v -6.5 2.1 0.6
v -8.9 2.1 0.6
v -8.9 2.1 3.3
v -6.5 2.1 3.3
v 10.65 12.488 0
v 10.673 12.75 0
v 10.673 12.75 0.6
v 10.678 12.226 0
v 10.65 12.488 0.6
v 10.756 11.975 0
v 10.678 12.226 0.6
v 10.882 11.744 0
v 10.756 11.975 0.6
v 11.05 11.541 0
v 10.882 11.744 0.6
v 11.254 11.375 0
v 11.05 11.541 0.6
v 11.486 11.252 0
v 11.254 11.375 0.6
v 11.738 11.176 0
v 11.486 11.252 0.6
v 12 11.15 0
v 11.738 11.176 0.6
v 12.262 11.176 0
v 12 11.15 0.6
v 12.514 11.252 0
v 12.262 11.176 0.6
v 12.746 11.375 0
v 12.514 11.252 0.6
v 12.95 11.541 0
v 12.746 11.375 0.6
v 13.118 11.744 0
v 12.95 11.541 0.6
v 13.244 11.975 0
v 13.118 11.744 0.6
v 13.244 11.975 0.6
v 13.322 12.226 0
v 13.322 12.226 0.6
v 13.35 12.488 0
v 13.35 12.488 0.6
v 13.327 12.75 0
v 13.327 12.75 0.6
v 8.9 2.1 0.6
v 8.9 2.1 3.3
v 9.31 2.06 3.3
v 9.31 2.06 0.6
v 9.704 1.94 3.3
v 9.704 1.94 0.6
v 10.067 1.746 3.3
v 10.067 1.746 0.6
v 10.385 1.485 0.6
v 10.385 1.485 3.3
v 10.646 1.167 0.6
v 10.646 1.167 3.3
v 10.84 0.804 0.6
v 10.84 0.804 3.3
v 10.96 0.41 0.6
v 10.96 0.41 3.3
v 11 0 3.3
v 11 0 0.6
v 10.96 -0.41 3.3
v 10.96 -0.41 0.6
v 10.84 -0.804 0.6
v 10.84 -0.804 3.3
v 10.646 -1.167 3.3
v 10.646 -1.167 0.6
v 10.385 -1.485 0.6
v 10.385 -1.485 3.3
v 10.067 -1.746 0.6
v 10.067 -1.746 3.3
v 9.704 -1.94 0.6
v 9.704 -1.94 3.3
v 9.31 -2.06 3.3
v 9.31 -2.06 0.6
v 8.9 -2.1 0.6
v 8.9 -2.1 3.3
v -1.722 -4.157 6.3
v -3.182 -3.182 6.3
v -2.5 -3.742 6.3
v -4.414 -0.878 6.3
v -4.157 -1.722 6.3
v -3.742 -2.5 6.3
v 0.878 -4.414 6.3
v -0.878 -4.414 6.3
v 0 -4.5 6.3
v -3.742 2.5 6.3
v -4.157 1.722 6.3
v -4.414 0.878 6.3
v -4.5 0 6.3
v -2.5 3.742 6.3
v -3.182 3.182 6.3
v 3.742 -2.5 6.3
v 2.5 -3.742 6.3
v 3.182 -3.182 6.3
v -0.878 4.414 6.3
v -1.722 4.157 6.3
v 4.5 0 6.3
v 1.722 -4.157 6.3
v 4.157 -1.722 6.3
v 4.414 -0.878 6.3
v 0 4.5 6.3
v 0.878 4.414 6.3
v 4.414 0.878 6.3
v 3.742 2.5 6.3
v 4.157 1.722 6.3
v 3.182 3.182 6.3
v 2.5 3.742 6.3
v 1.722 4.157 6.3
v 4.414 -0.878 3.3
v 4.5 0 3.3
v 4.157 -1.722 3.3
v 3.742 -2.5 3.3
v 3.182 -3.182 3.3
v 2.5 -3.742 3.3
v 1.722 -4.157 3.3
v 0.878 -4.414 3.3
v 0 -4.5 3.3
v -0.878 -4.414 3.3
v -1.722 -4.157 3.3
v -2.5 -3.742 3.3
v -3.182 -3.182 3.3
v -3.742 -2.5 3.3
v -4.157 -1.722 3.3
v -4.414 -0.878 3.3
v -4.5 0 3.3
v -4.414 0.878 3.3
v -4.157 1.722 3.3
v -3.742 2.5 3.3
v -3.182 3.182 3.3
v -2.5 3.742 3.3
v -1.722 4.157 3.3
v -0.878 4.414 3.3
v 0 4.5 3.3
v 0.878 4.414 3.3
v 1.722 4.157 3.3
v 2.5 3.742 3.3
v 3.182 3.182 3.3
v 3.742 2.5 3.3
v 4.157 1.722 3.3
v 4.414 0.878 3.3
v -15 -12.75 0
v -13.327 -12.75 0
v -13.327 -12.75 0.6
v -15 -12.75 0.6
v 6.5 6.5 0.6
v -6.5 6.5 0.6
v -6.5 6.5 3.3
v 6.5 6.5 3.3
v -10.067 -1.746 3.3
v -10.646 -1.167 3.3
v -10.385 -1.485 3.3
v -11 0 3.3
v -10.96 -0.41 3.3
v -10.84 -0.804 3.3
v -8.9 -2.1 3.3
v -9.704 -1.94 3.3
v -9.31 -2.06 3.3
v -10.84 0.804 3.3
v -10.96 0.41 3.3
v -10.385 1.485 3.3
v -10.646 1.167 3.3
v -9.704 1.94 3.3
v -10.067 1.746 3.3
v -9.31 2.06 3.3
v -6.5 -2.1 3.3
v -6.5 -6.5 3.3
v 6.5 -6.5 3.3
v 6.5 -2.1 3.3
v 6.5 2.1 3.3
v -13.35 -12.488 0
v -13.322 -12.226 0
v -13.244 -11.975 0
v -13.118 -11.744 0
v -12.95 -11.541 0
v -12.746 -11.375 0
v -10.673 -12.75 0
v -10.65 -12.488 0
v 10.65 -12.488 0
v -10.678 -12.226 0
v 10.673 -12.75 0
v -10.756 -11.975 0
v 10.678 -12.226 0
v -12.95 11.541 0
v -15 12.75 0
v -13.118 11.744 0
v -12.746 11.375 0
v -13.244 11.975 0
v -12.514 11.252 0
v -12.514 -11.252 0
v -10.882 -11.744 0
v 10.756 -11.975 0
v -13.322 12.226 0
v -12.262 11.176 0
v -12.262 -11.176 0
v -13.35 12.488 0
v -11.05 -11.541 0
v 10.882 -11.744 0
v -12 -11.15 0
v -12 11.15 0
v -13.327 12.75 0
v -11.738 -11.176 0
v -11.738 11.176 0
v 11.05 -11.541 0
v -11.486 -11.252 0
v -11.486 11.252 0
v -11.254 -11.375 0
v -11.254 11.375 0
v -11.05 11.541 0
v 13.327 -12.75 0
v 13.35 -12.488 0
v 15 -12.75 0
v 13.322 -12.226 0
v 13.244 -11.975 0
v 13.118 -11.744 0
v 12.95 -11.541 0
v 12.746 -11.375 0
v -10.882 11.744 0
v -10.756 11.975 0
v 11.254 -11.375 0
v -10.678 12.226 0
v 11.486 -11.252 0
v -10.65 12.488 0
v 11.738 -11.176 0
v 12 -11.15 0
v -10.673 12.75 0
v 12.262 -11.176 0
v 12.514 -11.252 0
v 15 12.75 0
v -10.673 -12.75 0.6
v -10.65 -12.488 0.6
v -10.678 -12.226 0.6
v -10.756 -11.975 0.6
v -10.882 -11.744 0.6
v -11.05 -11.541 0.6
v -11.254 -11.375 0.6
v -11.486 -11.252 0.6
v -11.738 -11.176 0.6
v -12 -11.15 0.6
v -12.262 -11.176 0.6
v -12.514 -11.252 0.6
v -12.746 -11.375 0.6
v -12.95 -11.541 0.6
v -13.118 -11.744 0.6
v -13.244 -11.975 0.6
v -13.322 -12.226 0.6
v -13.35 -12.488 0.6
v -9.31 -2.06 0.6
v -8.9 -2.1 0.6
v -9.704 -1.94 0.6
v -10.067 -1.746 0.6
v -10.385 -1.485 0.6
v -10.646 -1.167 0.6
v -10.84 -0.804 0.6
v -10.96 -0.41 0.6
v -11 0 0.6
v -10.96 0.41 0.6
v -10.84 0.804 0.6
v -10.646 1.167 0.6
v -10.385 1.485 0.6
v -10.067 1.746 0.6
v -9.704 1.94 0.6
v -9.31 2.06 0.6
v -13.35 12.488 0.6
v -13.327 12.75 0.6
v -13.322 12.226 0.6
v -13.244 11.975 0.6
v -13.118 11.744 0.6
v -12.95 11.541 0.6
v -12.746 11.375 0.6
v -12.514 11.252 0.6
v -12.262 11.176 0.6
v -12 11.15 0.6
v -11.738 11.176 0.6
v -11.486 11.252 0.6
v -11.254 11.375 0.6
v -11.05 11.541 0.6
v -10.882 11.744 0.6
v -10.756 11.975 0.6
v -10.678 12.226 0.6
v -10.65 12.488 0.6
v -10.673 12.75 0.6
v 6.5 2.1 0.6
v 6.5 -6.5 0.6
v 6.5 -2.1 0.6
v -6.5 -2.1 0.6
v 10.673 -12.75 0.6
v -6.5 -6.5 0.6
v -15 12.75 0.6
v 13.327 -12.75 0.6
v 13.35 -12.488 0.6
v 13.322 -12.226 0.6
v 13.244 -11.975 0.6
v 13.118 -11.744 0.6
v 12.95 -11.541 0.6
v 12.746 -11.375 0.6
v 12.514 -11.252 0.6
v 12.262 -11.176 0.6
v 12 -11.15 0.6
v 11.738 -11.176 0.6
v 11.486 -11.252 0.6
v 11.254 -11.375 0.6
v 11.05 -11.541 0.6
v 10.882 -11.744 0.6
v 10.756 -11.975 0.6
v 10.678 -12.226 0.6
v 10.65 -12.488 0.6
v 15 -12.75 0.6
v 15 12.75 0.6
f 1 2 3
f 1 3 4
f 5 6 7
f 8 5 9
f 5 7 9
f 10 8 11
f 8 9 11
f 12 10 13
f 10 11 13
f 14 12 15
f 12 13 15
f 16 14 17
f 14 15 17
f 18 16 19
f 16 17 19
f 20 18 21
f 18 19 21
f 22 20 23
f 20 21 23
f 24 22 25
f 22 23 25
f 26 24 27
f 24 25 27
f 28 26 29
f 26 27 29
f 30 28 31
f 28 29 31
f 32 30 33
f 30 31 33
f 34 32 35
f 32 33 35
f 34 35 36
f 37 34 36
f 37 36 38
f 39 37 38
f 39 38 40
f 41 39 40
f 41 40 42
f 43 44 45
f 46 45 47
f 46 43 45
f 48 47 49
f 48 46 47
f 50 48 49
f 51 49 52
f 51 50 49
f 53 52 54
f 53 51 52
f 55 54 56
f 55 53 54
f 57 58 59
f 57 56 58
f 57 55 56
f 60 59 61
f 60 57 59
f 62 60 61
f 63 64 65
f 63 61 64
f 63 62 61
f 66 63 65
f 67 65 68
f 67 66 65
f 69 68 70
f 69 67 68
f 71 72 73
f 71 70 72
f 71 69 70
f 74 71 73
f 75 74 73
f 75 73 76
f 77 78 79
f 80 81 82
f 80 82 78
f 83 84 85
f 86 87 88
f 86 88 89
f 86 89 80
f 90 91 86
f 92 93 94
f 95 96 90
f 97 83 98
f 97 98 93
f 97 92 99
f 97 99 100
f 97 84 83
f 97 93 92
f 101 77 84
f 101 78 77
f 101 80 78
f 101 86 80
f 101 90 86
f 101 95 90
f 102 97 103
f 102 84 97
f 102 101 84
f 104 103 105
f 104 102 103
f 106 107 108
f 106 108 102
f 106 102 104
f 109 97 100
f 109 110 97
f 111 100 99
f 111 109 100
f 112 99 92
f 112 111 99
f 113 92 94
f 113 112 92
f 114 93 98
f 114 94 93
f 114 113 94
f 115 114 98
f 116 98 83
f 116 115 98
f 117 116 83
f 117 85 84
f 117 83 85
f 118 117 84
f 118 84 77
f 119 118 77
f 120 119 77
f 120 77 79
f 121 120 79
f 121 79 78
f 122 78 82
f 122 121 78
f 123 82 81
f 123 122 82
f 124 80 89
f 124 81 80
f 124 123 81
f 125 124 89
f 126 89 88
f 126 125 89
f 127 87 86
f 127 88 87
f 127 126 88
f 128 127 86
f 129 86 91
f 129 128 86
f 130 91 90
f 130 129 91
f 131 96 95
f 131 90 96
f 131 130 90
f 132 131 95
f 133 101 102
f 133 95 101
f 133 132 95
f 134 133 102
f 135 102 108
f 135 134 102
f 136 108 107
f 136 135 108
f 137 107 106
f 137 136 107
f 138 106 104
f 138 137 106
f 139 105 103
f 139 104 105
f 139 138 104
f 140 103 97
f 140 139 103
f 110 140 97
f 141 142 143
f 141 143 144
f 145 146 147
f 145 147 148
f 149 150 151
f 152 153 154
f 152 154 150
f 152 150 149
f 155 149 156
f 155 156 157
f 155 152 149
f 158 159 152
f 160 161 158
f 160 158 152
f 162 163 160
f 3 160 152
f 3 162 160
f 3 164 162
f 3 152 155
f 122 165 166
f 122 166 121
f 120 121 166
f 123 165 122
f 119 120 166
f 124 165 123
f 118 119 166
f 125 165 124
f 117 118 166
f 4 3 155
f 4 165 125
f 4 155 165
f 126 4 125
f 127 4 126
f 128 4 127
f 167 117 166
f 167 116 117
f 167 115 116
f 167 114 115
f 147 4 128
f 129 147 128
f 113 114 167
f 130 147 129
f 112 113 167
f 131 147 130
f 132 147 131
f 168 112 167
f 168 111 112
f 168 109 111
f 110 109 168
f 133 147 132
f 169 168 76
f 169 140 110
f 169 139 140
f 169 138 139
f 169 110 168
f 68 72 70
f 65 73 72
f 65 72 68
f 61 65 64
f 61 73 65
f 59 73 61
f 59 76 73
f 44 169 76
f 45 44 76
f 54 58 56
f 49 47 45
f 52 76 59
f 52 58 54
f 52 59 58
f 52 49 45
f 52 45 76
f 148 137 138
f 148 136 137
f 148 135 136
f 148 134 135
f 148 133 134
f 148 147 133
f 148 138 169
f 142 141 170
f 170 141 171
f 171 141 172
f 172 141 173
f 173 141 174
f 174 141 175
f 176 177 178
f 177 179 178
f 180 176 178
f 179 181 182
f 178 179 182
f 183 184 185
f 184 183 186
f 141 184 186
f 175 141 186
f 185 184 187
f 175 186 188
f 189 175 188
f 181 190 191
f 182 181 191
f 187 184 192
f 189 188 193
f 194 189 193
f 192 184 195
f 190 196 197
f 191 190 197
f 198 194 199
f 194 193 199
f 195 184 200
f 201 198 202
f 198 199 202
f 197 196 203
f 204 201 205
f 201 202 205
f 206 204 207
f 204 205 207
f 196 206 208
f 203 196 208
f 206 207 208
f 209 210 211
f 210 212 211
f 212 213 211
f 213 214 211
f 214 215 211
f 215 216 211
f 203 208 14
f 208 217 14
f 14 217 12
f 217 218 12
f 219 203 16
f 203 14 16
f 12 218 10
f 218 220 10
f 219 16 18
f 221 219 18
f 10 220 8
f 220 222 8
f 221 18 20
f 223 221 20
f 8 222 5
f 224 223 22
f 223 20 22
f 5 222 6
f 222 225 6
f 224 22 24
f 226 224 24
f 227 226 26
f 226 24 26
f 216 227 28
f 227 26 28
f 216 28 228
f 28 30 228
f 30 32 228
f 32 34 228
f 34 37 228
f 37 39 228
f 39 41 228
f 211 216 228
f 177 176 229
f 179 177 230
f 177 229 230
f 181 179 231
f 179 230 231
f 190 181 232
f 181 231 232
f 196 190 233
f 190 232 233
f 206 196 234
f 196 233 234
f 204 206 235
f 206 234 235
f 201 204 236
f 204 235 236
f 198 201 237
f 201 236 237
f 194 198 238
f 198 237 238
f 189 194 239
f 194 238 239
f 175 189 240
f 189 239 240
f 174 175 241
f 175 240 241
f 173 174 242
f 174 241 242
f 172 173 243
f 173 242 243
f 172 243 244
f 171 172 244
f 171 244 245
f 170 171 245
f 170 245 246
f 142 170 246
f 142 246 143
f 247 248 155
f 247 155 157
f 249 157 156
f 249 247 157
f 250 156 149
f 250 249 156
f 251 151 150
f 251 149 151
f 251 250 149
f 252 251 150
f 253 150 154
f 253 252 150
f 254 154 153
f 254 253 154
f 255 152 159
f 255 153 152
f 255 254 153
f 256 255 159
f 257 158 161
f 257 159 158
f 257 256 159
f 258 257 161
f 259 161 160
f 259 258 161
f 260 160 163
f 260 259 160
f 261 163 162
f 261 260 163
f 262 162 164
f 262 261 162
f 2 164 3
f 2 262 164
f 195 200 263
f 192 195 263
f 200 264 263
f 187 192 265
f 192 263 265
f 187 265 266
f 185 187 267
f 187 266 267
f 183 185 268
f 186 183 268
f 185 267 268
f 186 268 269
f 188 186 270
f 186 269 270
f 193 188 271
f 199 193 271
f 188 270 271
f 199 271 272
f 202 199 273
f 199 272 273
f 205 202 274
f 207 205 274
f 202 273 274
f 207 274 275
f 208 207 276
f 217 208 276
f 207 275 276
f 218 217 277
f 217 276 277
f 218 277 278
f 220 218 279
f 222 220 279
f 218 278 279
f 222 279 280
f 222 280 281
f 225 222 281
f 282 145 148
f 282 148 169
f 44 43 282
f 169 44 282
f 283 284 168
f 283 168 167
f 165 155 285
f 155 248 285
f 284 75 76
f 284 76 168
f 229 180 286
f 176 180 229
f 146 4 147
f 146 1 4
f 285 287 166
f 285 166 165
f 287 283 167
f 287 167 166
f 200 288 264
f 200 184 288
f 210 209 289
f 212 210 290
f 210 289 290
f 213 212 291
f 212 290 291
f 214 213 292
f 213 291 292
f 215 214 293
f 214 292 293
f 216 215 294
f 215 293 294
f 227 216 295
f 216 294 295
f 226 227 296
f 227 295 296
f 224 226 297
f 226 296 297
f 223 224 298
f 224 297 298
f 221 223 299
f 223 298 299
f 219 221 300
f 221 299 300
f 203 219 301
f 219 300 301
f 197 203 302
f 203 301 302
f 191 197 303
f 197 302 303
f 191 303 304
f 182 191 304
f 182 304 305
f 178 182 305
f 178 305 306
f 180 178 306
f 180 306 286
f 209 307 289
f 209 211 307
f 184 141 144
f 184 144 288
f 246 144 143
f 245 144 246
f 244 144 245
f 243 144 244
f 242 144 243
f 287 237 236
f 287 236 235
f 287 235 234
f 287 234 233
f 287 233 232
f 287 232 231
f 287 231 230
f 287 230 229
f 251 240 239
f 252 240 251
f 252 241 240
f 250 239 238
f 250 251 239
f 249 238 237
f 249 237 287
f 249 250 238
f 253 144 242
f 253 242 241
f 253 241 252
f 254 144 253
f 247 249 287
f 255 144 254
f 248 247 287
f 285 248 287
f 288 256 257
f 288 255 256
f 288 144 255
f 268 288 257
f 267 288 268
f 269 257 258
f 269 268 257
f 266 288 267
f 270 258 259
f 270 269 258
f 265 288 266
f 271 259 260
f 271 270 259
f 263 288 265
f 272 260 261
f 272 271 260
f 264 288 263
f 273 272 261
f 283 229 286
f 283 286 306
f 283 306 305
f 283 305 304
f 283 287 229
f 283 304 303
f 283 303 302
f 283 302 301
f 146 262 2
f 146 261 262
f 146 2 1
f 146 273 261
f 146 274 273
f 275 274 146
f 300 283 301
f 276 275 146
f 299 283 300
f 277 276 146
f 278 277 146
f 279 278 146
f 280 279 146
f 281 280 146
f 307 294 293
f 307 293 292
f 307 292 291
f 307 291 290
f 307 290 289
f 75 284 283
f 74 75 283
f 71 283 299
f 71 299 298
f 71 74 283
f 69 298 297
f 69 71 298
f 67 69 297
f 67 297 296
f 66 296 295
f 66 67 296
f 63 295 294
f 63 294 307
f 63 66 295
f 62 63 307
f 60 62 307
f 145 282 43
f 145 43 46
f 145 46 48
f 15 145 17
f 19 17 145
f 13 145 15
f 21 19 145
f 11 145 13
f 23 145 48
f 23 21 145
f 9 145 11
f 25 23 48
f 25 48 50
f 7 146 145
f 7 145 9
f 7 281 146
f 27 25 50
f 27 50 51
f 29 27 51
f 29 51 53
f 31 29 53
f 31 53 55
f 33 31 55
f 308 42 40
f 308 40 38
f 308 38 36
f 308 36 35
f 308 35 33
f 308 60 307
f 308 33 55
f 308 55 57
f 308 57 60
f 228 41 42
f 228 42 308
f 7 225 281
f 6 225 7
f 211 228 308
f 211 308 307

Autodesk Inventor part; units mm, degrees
ref_plane "YZ Plane" through (0, 0, 0) normal (1, 0, 0) x (0, 1, 0)
ref_plane "XZ Plane" through (0, 0, 0) normal (0, 1, 0) x (-1, 0, 0)
ref_plane "XY Plane" through (0, 0, 0) normal (0, 0, 1) x (1, 0, 0)
sketch "스케치1" plane through (0, 0, 0) normal (0, 0, 1) x (1, 0, 0)
  line L0 (-15, 12.75) -> (15, 12.75)
  line L1 (15, 12.75) -> (15, -12.75)
  line L2 (15, -12.75) -> (-15, -12.75)
  line L3 (-15, -12.75) -> (-15, 12.75)
  line L4 (-15, 12.75) -> (15, -12.75) construction
  line L5 (15, 12.75) -> (-15, -12.75) construction
  point P0 (0, 0)
  dimension "d0" = 30
  dimension "d1" = 25.5
extrude "돌출1" add sketch "스케치1" along normal blind 0.6
sketch "스케치2" plane through (0, 0, 0.6) normal (0, 0, 1) x (1, 0, 0)
  line L0 (-12, 12.5) -> (12, 12.5) construction
  line L1 (12, 12.5) -> (12, -12.5) construction
  line L2 (12, -12.5) -> (-12, -12.5) construction
  line L3 (-12, -12.5) -> (-12, 12.5) construction
  line L4 (-12, 12.5) -> (12, -12.5) construction
  line L5 (12, 12.5) -> (-12, -12.5) construction
  circle A0 centre (-12, 12.5) radius 1.35
  line L6 (0, 0) -> (2.9339, 0)
  line L7 (0, 0) -> (0, 3.0969)
  circle A1 centre (12, 12.5) radius 1.35
  circle A2 centre (-12, -12.5) radius 1.35
  circle A3 centre (12, -12.5) radius 1.35
  dimension "d4" = 24
  dimension "d5" = 25
  dimension "d6" = 2.7
extrude "돌출2" cut sketch "스케치2" against normal blind 0.6
sketch "스케치3" plane through (0, 0, 0.6) normal (0, 0, 1) x (1, 0, 0)
  line L0 (-6.5, 6.5) -> (6.5, 6.5)
  line L1 (6.5, 6.5) -> (6.5, -6.5)
  line L2 (6.5, -6.5) -> (-6.5, -6.5)
  line L3 (-6.5, -6.5) -> (-6.5, 6.5)
  line L4 (-6.5, 6.5) -> (6.5, -6.5) construction
  line L5 (6.5, 6.5) -> (-6.5, -6.5) construction
  circle A0 centre (8.9, 0) radius 2.1
  line L6 (8.9, 2.1) -> (6.5, 2.1)
  line L7 (8.9, -2.1) -> (6.5, -2.1)
  line L8 (0, 0) -> (0, 1.8337)
  circle A1 centre (-8.9, 0) radius 2.1
  line L9 (-8.9, 2.1) -> (-6.5, 2.1)
  line L10 (-8.9, -2.1) -> (-6.5, -2.1)
  dimension "d9" = 13
  dimension "d10" = 13
  dimension "d11" = 4.2
  dimension "d12" = 17.8
extrude "돌출3" add sketch "스케치3" along normal blind 2.7
sketch "스케치4" plane through (0, 0, 3.3) normal (0, 0, 1) x (1, 0, 0)
  circle A0 centre (0, 0) radius 4.5
  dimension "d15" = 9
extrude "돌출4" add sketch "스케치4" along normal blind 3
properties part number "카메라"
